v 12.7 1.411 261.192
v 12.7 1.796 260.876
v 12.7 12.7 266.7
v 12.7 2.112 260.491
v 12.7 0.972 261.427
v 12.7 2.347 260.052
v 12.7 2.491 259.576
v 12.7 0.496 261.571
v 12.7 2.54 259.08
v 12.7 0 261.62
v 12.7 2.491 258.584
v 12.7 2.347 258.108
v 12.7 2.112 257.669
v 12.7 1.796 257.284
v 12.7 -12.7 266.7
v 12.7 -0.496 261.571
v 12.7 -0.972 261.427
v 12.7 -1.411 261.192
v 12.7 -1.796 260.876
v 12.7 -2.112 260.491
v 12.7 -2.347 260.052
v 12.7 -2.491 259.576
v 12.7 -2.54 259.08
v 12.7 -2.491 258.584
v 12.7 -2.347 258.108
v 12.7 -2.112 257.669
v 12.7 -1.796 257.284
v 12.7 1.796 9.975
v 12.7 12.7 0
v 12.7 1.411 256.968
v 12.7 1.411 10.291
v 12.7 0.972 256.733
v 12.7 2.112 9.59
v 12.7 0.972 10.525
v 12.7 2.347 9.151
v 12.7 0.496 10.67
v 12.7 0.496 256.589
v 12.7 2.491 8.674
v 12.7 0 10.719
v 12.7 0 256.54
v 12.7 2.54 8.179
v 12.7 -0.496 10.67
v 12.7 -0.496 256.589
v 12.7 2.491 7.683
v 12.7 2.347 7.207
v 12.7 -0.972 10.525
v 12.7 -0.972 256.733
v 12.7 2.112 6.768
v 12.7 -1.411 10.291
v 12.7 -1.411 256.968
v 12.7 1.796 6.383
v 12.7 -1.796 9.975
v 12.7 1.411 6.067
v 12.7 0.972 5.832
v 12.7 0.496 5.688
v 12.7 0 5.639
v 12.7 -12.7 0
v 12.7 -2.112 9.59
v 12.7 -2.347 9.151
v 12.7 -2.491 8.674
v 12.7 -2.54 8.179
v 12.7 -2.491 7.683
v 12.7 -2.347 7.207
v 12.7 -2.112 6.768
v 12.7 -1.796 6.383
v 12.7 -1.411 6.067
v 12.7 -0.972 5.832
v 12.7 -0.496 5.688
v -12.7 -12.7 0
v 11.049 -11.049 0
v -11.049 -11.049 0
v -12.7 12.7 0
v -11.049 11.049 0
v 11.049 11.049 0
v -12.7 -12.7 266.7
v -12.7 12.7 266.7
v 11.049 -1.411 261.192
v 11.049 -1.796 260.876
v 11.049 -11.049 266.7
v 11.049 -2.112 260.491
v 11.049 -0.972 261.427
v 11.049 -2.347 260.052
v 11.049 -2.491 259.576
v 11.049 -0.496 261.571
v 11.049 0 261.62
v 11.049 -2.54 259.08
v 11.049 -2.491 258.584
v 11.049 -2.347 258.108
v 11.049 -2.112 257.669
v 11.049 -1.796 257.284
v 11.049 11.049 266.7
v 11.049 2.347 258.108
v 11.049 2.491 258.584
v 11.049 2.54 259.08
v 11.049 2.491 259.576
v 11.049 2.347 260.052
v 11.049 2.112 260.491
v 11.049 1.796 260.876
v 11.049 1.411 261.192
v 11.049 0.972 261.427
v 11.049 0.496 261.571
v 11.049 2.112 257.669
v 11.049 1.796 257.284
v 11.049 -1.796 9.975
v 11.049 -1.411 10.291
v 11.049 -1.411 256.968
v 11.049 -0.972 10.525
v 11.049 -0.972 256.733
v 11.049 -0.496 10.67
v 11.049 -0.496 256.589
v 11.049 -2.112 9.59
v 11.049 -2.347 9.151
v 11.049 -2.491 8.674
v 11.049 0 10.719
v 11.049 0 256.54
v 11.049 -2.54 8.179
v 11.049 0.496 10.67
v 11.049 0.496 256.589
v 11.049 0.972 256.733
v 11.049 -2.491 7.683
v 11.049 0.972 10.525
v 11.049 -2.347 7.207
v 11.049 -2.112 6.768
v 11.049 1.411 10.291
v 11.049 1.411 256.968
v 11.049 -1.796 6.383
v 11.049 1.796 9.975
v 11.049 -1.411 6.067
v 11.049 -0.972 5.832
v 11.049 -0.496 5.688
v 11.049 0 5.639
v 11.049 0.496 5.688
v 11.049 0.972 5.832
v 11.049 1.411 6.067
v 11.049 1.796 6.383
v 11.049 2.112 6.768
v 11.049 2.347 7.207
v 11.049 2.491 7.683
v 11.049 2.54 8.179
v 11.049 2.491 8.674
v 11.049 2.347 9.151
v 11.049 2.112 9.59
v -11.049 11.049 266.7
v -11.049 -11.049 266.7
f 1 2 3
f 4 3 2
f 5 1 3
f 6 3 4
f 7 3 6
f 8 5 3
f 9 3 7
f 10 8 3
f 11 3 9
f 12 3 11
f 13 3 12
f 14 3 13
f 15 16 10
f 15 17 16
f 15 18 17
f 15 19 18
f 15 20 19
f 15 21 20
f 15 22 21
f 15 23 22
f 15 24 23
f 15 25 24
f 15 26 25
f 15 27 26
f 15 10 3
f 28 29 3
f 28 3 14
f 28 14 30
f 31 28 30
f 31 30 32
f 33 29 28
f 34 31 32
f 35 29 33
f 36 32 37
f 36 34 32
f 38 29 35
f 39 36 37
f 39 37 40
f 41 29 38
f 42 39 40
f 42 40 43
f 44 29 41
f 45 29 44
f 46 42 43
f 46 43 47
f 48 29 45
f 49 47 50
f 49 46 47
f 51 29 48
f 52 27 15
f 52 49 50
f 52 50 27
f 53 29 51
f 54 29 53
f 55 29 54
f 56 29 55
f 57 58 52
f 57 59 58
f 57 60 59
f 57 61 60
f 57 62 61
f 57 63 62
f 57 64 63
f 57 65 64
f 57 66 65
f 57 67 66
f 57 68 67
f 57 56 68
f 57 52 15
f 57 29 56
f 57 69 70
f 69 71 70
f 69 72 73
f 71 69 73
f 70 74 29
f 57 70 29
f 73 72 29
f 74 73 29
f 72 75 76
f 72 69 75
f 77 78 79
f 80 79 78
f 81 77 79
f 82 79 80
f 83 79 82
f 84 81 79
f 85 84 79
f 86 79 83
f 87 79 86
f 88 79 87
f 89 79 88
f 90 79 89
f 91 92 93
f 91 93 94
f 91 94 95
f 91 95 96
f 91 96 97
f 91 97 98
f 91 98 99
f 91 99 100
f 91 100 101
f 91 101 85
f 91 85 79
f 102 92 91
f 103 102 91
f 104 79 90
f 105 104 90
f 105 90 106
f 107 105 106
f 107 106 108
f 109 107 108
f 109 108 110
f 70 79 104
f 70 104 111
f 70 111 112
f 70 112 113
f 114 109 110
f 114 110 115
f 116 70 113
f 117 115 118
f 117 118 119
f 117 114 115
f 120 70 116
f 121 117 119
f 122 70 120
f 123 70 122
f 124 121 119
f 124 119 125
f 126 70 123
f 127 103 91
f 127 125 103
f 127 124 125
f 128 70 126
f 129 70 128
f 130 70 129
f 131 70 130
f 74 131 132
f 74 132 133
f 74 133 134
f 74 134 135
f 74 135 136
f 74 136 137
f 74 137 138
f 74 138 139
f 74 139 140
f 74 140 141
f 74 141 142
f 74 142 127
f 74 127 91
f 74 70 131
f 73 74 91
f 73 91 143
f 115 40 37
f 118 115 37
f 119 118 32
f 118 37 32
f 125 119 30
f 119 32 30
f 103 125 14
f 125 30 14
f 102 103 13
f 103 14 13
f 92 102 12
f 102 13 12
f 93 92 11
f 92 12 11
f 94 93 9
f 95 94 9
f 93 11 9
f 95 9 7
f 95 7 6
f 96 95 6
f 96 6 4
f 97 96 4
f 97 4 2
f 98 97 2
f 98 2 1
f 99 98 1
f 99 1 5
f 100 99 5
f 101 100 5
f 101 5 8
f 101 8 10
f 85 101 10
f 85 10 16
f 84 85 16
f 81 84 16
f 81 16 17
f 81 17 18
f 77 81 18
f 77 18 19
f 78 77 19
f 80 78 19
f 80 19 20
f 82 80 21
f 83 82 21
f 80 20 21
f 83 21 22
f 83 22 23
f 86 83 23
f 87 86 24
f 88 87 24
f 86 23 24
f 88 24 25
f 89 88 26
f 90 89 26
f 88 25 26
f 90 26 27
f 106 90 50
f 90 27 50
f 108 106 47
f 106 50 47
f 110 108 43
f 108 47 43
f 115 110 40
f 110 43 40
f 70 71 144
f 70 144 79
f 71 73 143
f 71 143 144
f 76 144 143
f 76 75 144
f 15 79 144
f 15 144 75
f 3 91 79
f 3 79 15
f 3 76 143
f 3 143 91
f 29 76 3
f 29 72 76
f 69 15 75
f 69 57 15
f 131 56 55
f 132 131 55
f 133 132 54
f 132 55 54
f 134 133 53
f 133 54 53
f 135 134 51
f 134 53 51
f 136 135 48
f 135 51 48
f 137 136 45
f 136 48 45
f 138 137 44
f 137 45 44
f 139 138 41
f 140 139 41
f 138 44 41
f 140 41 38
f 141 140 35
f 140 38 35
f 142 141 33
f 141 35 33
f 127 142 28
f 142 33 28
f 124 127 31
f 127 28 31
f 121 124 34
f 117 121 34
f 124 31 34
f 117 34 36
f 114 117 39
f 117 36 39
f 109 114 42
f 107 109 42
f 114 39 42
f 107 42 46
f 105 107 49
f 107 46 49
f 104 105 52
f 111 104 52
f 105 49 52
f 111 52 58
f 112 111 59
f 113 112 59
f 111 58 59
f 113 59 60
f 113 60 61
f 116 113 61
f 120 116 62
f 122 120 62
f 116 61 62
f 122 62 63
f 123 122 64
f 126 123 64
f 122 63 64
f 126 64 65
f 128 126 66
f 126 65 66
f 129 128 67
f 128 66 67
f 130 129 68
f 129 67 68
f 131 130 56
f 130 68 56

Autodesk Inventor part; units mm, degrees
ref_plane "YZ Plane" through (0, 0, 0) normal (1, 0, 0) x (0, 1, 0)
ref_plane "XZ Plane" through (0, 0, 0) normal (0, 1, 0) x (-1, 0, 0)
ref_plane "XY Plane" through (0, 0, 0) normal (0, 0, 1) x (1, 0, 0)
sketch "Sketch1" plane through (0, 0, 0) normal (0, 0, 1) x (1, 0, 0)
  line L0 (12.7, -12.7) -> (-12.7, -12.7)
  line L1 (-12.7, -12.7) -> (-12.7, 12.7)
  line L2 (-12.7, 12.7) -> (12.7, 12.7)
  line L3 (12.7, 12.7) -> (12.7, -12.7)
  line L4 (12.7, -12.7) -> (-12.7, 12.7) construction
  line L5 (-12.7, -12.7) -> (12.7, 12.7) construction
  line L6 (11.049, 11.049) -> (-11.049, 11.049)
  line L7 (-11.049, 11.049) -> (-11.049, -11.049)
  line L8 (-11.049, -11.049) -> (11.049, -11.049)
  line L9 (11.049, -11.049) -> (11.049, 11.049)
  line L10 (11.049, 11.049) -> (-11.049, -11.049) construction
  line L11 (-11.049, 11.049) -> (11.049, -11.049) construction
  point P0 (0, 0)
  dimension "d0" = 25.4
  dimension "d1" = 25.4
  dimension "d2" = 1.651
  dimension "d3" = 1.651
extrude "Extrusion1" add sketch "Sketch1" along normal blind 266.7
sketch "Sketch2" plane through (12.7, -12.7, 0) normal (1, 0, 0) x (0, 0, -1)
  circle A0 centre (-8.1788, 12.7) radius 2.54
  circle A1 centre (-259.08, 12.7) radius 2.54
  line L0 (0, 25.4) -> (0, 0) projected
  line L1 (-266.7, 0) -> (-266.7, 25.4) projected
  line L2 (0, 0) -> (-266.7, 0) projected
  point P0 (0, 12.7)
  dimension "d6" = 250.9012
  dimension "d7" = 5.08
  dimension "d8" = 5.08
  dimension "d15" = 12.7
  dimension "d16" = 12.7
  dimension "d17" = 7.62
extrude "Extrusion2" cut sketch "Sketch2" against normal blind 2.54
equation "\"d3\" = d2"
equation "\"d8\" = d7"
properties part number "push bar"
